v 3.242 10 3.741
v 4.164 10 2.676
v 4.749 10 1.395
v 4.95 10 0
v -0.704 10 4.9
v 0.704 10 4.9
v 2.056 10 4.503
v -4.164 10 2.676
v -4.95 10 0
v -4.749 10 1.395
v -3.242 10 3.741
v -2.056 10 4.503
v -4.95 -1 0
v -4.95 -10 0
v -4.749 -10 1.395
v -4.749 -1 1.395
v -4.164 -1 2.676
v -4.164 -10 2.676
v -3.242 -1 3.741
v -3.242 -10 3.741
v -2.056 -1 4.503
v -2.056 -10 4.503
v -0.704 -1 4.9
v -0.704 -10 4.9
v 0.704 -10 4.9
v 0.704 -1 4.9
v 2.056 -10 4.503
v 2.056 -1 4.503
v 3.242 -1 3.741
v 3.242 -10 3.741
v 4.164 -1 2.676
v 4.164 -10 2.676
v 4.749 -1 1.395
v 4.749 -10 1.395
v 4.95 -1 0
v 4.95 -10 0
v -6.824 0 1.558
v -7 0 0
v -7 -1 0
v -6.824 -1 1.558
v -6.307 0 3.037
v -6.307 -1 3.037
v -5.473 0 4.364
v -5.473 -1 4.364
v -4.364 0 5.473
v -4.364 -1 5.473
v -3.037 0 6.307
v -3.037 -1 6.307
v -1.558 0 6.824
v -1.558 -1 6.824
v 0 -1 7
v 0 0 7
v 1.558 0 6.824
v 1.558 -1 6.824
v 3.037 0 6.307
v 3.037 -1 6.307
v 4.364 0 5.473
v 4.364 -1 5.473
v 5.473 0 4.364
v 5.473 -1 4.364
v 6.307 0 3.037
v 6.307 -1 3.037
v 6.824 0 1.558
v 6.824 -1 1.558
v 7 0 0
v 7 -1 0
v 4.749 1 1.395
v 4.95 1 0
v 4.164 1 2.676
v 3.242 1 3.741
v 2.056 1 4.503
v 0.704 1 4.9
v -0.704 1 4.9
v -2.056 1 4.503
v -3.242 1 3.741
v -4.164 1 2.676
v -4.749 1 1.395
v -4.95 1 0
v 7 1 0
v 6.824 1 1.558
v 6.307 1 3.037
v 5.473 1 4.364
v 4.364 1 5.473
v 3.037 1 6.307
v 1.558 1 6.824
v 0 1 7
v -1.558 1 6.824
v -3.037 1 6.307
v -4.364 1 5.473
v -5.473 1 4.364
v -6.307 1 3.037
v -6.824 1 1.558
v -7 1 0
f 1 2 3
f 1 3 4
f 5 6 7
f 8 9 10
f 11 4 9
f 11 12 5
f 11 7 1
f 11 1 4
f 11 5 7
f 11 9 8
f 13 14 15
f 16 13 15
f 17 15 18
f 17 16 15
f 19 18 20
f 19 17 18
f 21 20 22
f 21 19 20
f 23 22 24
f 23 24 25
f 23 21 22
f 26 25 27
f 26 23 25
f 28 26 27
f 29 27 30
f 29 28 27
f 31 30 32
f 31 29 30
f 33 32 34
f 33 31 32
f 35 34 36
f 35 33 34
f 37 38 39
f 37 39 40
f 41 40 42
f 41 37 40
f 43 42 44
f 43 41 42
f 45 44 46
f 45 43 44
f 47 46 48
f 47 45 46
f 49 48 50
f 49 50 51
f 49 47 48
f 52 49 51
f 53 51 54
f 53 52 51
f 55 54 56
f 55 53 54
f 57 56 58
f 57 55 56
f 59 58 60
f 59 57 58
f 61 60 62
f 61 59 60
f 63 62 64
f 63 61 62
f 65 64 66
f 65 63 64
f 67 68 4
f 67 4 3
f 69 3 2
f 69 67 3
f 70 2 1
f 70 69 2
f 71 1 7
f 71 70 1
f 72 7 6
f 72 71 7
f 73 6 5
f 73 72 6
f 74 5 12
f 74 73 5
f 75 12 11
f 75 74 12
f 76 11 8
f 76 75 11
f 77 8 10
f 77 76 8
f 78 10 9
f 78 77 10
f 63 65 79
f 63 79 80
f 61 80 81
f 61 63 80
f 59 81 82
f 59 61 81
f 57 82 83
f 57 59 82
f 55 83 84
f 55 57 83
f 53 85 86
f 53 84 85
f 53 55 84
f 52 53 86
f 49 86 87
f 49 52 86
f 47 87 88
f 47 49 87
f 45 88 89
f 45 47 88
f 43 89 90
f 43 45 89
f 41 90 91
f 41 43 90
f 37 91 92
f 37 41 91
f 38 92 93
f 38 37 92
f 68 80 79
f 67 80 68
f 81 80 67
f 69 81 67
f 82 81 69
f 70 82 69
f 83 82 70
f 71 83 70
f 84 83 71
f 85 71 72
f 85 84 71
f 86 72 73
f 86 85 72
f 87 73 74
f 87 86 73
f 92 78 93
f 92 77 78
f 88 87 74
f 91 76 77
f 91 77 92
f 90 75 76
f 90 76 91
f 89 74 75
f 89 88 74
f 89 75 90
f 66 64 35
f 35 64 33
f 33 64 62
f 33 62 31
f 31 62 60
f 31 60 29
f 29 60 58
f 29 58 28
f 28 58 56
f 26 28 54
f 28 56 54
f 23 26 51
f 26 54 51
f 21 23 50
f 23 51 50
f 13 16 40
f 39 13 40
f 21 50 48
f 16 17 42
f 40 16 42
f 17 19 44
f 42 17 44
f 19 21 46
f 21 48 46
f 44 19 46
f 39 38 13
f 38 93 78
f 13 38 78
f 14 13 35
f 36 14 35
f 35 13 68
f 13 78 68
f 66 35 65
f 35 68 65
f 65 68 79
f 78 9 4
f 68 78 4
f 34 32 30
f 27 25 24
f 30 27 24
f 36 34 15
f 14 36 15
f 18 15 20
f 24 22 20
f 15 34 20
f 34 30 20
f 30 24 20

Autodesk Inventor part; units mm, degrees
ref_plane "YZ Plane" through (0, 0, 0) normal (1, 0, 0) x (0, 1, 0)
ref_plane "XZ Plane" through (0, 0, 0) normal (0, 1, 0) x (-1, 0, 0)
ref_plane "XY Plane" through (0, 0, 0) normal (0, 0, 1) x (1, 0, 0)
sketch "Sketch1" plane through (0, 0, 0) normal (0, 1, 0) x (-1, 0, 0)
  circle A0 centre (0, 0) radius 4.95
  dimension "d0" = 9.9
extrude "Extrusion1" add sketch "Sketch1" along normal mid plane 20
sketch "Sketch2" plane through (0, 0, 0) normal (0, 1, 0) x (-1, 0, 0)
  circle A0 centre (0, 0) radius 7
  dimension "d3" = 14
extrude "Extrusion2" add sketch "Sketch2" along normal mid plane 2
sketch "Sketch3" plane through (0, 10, 0) normal (0, 1, 0) x (1, 0, 0)
  line L0 (-12, 0) -> (13, 0)
  line L1 (13, 0) -> (13, 11)
  line L2 (13, 11) -> (-12, 11)
  line L3 (-12, 11) -> (-12, 0)
  point P0 (0, 0)
extrude "Extrusion3" cut sketch "Sketch3" against normal blind 28
properties part number "wall_pin"
